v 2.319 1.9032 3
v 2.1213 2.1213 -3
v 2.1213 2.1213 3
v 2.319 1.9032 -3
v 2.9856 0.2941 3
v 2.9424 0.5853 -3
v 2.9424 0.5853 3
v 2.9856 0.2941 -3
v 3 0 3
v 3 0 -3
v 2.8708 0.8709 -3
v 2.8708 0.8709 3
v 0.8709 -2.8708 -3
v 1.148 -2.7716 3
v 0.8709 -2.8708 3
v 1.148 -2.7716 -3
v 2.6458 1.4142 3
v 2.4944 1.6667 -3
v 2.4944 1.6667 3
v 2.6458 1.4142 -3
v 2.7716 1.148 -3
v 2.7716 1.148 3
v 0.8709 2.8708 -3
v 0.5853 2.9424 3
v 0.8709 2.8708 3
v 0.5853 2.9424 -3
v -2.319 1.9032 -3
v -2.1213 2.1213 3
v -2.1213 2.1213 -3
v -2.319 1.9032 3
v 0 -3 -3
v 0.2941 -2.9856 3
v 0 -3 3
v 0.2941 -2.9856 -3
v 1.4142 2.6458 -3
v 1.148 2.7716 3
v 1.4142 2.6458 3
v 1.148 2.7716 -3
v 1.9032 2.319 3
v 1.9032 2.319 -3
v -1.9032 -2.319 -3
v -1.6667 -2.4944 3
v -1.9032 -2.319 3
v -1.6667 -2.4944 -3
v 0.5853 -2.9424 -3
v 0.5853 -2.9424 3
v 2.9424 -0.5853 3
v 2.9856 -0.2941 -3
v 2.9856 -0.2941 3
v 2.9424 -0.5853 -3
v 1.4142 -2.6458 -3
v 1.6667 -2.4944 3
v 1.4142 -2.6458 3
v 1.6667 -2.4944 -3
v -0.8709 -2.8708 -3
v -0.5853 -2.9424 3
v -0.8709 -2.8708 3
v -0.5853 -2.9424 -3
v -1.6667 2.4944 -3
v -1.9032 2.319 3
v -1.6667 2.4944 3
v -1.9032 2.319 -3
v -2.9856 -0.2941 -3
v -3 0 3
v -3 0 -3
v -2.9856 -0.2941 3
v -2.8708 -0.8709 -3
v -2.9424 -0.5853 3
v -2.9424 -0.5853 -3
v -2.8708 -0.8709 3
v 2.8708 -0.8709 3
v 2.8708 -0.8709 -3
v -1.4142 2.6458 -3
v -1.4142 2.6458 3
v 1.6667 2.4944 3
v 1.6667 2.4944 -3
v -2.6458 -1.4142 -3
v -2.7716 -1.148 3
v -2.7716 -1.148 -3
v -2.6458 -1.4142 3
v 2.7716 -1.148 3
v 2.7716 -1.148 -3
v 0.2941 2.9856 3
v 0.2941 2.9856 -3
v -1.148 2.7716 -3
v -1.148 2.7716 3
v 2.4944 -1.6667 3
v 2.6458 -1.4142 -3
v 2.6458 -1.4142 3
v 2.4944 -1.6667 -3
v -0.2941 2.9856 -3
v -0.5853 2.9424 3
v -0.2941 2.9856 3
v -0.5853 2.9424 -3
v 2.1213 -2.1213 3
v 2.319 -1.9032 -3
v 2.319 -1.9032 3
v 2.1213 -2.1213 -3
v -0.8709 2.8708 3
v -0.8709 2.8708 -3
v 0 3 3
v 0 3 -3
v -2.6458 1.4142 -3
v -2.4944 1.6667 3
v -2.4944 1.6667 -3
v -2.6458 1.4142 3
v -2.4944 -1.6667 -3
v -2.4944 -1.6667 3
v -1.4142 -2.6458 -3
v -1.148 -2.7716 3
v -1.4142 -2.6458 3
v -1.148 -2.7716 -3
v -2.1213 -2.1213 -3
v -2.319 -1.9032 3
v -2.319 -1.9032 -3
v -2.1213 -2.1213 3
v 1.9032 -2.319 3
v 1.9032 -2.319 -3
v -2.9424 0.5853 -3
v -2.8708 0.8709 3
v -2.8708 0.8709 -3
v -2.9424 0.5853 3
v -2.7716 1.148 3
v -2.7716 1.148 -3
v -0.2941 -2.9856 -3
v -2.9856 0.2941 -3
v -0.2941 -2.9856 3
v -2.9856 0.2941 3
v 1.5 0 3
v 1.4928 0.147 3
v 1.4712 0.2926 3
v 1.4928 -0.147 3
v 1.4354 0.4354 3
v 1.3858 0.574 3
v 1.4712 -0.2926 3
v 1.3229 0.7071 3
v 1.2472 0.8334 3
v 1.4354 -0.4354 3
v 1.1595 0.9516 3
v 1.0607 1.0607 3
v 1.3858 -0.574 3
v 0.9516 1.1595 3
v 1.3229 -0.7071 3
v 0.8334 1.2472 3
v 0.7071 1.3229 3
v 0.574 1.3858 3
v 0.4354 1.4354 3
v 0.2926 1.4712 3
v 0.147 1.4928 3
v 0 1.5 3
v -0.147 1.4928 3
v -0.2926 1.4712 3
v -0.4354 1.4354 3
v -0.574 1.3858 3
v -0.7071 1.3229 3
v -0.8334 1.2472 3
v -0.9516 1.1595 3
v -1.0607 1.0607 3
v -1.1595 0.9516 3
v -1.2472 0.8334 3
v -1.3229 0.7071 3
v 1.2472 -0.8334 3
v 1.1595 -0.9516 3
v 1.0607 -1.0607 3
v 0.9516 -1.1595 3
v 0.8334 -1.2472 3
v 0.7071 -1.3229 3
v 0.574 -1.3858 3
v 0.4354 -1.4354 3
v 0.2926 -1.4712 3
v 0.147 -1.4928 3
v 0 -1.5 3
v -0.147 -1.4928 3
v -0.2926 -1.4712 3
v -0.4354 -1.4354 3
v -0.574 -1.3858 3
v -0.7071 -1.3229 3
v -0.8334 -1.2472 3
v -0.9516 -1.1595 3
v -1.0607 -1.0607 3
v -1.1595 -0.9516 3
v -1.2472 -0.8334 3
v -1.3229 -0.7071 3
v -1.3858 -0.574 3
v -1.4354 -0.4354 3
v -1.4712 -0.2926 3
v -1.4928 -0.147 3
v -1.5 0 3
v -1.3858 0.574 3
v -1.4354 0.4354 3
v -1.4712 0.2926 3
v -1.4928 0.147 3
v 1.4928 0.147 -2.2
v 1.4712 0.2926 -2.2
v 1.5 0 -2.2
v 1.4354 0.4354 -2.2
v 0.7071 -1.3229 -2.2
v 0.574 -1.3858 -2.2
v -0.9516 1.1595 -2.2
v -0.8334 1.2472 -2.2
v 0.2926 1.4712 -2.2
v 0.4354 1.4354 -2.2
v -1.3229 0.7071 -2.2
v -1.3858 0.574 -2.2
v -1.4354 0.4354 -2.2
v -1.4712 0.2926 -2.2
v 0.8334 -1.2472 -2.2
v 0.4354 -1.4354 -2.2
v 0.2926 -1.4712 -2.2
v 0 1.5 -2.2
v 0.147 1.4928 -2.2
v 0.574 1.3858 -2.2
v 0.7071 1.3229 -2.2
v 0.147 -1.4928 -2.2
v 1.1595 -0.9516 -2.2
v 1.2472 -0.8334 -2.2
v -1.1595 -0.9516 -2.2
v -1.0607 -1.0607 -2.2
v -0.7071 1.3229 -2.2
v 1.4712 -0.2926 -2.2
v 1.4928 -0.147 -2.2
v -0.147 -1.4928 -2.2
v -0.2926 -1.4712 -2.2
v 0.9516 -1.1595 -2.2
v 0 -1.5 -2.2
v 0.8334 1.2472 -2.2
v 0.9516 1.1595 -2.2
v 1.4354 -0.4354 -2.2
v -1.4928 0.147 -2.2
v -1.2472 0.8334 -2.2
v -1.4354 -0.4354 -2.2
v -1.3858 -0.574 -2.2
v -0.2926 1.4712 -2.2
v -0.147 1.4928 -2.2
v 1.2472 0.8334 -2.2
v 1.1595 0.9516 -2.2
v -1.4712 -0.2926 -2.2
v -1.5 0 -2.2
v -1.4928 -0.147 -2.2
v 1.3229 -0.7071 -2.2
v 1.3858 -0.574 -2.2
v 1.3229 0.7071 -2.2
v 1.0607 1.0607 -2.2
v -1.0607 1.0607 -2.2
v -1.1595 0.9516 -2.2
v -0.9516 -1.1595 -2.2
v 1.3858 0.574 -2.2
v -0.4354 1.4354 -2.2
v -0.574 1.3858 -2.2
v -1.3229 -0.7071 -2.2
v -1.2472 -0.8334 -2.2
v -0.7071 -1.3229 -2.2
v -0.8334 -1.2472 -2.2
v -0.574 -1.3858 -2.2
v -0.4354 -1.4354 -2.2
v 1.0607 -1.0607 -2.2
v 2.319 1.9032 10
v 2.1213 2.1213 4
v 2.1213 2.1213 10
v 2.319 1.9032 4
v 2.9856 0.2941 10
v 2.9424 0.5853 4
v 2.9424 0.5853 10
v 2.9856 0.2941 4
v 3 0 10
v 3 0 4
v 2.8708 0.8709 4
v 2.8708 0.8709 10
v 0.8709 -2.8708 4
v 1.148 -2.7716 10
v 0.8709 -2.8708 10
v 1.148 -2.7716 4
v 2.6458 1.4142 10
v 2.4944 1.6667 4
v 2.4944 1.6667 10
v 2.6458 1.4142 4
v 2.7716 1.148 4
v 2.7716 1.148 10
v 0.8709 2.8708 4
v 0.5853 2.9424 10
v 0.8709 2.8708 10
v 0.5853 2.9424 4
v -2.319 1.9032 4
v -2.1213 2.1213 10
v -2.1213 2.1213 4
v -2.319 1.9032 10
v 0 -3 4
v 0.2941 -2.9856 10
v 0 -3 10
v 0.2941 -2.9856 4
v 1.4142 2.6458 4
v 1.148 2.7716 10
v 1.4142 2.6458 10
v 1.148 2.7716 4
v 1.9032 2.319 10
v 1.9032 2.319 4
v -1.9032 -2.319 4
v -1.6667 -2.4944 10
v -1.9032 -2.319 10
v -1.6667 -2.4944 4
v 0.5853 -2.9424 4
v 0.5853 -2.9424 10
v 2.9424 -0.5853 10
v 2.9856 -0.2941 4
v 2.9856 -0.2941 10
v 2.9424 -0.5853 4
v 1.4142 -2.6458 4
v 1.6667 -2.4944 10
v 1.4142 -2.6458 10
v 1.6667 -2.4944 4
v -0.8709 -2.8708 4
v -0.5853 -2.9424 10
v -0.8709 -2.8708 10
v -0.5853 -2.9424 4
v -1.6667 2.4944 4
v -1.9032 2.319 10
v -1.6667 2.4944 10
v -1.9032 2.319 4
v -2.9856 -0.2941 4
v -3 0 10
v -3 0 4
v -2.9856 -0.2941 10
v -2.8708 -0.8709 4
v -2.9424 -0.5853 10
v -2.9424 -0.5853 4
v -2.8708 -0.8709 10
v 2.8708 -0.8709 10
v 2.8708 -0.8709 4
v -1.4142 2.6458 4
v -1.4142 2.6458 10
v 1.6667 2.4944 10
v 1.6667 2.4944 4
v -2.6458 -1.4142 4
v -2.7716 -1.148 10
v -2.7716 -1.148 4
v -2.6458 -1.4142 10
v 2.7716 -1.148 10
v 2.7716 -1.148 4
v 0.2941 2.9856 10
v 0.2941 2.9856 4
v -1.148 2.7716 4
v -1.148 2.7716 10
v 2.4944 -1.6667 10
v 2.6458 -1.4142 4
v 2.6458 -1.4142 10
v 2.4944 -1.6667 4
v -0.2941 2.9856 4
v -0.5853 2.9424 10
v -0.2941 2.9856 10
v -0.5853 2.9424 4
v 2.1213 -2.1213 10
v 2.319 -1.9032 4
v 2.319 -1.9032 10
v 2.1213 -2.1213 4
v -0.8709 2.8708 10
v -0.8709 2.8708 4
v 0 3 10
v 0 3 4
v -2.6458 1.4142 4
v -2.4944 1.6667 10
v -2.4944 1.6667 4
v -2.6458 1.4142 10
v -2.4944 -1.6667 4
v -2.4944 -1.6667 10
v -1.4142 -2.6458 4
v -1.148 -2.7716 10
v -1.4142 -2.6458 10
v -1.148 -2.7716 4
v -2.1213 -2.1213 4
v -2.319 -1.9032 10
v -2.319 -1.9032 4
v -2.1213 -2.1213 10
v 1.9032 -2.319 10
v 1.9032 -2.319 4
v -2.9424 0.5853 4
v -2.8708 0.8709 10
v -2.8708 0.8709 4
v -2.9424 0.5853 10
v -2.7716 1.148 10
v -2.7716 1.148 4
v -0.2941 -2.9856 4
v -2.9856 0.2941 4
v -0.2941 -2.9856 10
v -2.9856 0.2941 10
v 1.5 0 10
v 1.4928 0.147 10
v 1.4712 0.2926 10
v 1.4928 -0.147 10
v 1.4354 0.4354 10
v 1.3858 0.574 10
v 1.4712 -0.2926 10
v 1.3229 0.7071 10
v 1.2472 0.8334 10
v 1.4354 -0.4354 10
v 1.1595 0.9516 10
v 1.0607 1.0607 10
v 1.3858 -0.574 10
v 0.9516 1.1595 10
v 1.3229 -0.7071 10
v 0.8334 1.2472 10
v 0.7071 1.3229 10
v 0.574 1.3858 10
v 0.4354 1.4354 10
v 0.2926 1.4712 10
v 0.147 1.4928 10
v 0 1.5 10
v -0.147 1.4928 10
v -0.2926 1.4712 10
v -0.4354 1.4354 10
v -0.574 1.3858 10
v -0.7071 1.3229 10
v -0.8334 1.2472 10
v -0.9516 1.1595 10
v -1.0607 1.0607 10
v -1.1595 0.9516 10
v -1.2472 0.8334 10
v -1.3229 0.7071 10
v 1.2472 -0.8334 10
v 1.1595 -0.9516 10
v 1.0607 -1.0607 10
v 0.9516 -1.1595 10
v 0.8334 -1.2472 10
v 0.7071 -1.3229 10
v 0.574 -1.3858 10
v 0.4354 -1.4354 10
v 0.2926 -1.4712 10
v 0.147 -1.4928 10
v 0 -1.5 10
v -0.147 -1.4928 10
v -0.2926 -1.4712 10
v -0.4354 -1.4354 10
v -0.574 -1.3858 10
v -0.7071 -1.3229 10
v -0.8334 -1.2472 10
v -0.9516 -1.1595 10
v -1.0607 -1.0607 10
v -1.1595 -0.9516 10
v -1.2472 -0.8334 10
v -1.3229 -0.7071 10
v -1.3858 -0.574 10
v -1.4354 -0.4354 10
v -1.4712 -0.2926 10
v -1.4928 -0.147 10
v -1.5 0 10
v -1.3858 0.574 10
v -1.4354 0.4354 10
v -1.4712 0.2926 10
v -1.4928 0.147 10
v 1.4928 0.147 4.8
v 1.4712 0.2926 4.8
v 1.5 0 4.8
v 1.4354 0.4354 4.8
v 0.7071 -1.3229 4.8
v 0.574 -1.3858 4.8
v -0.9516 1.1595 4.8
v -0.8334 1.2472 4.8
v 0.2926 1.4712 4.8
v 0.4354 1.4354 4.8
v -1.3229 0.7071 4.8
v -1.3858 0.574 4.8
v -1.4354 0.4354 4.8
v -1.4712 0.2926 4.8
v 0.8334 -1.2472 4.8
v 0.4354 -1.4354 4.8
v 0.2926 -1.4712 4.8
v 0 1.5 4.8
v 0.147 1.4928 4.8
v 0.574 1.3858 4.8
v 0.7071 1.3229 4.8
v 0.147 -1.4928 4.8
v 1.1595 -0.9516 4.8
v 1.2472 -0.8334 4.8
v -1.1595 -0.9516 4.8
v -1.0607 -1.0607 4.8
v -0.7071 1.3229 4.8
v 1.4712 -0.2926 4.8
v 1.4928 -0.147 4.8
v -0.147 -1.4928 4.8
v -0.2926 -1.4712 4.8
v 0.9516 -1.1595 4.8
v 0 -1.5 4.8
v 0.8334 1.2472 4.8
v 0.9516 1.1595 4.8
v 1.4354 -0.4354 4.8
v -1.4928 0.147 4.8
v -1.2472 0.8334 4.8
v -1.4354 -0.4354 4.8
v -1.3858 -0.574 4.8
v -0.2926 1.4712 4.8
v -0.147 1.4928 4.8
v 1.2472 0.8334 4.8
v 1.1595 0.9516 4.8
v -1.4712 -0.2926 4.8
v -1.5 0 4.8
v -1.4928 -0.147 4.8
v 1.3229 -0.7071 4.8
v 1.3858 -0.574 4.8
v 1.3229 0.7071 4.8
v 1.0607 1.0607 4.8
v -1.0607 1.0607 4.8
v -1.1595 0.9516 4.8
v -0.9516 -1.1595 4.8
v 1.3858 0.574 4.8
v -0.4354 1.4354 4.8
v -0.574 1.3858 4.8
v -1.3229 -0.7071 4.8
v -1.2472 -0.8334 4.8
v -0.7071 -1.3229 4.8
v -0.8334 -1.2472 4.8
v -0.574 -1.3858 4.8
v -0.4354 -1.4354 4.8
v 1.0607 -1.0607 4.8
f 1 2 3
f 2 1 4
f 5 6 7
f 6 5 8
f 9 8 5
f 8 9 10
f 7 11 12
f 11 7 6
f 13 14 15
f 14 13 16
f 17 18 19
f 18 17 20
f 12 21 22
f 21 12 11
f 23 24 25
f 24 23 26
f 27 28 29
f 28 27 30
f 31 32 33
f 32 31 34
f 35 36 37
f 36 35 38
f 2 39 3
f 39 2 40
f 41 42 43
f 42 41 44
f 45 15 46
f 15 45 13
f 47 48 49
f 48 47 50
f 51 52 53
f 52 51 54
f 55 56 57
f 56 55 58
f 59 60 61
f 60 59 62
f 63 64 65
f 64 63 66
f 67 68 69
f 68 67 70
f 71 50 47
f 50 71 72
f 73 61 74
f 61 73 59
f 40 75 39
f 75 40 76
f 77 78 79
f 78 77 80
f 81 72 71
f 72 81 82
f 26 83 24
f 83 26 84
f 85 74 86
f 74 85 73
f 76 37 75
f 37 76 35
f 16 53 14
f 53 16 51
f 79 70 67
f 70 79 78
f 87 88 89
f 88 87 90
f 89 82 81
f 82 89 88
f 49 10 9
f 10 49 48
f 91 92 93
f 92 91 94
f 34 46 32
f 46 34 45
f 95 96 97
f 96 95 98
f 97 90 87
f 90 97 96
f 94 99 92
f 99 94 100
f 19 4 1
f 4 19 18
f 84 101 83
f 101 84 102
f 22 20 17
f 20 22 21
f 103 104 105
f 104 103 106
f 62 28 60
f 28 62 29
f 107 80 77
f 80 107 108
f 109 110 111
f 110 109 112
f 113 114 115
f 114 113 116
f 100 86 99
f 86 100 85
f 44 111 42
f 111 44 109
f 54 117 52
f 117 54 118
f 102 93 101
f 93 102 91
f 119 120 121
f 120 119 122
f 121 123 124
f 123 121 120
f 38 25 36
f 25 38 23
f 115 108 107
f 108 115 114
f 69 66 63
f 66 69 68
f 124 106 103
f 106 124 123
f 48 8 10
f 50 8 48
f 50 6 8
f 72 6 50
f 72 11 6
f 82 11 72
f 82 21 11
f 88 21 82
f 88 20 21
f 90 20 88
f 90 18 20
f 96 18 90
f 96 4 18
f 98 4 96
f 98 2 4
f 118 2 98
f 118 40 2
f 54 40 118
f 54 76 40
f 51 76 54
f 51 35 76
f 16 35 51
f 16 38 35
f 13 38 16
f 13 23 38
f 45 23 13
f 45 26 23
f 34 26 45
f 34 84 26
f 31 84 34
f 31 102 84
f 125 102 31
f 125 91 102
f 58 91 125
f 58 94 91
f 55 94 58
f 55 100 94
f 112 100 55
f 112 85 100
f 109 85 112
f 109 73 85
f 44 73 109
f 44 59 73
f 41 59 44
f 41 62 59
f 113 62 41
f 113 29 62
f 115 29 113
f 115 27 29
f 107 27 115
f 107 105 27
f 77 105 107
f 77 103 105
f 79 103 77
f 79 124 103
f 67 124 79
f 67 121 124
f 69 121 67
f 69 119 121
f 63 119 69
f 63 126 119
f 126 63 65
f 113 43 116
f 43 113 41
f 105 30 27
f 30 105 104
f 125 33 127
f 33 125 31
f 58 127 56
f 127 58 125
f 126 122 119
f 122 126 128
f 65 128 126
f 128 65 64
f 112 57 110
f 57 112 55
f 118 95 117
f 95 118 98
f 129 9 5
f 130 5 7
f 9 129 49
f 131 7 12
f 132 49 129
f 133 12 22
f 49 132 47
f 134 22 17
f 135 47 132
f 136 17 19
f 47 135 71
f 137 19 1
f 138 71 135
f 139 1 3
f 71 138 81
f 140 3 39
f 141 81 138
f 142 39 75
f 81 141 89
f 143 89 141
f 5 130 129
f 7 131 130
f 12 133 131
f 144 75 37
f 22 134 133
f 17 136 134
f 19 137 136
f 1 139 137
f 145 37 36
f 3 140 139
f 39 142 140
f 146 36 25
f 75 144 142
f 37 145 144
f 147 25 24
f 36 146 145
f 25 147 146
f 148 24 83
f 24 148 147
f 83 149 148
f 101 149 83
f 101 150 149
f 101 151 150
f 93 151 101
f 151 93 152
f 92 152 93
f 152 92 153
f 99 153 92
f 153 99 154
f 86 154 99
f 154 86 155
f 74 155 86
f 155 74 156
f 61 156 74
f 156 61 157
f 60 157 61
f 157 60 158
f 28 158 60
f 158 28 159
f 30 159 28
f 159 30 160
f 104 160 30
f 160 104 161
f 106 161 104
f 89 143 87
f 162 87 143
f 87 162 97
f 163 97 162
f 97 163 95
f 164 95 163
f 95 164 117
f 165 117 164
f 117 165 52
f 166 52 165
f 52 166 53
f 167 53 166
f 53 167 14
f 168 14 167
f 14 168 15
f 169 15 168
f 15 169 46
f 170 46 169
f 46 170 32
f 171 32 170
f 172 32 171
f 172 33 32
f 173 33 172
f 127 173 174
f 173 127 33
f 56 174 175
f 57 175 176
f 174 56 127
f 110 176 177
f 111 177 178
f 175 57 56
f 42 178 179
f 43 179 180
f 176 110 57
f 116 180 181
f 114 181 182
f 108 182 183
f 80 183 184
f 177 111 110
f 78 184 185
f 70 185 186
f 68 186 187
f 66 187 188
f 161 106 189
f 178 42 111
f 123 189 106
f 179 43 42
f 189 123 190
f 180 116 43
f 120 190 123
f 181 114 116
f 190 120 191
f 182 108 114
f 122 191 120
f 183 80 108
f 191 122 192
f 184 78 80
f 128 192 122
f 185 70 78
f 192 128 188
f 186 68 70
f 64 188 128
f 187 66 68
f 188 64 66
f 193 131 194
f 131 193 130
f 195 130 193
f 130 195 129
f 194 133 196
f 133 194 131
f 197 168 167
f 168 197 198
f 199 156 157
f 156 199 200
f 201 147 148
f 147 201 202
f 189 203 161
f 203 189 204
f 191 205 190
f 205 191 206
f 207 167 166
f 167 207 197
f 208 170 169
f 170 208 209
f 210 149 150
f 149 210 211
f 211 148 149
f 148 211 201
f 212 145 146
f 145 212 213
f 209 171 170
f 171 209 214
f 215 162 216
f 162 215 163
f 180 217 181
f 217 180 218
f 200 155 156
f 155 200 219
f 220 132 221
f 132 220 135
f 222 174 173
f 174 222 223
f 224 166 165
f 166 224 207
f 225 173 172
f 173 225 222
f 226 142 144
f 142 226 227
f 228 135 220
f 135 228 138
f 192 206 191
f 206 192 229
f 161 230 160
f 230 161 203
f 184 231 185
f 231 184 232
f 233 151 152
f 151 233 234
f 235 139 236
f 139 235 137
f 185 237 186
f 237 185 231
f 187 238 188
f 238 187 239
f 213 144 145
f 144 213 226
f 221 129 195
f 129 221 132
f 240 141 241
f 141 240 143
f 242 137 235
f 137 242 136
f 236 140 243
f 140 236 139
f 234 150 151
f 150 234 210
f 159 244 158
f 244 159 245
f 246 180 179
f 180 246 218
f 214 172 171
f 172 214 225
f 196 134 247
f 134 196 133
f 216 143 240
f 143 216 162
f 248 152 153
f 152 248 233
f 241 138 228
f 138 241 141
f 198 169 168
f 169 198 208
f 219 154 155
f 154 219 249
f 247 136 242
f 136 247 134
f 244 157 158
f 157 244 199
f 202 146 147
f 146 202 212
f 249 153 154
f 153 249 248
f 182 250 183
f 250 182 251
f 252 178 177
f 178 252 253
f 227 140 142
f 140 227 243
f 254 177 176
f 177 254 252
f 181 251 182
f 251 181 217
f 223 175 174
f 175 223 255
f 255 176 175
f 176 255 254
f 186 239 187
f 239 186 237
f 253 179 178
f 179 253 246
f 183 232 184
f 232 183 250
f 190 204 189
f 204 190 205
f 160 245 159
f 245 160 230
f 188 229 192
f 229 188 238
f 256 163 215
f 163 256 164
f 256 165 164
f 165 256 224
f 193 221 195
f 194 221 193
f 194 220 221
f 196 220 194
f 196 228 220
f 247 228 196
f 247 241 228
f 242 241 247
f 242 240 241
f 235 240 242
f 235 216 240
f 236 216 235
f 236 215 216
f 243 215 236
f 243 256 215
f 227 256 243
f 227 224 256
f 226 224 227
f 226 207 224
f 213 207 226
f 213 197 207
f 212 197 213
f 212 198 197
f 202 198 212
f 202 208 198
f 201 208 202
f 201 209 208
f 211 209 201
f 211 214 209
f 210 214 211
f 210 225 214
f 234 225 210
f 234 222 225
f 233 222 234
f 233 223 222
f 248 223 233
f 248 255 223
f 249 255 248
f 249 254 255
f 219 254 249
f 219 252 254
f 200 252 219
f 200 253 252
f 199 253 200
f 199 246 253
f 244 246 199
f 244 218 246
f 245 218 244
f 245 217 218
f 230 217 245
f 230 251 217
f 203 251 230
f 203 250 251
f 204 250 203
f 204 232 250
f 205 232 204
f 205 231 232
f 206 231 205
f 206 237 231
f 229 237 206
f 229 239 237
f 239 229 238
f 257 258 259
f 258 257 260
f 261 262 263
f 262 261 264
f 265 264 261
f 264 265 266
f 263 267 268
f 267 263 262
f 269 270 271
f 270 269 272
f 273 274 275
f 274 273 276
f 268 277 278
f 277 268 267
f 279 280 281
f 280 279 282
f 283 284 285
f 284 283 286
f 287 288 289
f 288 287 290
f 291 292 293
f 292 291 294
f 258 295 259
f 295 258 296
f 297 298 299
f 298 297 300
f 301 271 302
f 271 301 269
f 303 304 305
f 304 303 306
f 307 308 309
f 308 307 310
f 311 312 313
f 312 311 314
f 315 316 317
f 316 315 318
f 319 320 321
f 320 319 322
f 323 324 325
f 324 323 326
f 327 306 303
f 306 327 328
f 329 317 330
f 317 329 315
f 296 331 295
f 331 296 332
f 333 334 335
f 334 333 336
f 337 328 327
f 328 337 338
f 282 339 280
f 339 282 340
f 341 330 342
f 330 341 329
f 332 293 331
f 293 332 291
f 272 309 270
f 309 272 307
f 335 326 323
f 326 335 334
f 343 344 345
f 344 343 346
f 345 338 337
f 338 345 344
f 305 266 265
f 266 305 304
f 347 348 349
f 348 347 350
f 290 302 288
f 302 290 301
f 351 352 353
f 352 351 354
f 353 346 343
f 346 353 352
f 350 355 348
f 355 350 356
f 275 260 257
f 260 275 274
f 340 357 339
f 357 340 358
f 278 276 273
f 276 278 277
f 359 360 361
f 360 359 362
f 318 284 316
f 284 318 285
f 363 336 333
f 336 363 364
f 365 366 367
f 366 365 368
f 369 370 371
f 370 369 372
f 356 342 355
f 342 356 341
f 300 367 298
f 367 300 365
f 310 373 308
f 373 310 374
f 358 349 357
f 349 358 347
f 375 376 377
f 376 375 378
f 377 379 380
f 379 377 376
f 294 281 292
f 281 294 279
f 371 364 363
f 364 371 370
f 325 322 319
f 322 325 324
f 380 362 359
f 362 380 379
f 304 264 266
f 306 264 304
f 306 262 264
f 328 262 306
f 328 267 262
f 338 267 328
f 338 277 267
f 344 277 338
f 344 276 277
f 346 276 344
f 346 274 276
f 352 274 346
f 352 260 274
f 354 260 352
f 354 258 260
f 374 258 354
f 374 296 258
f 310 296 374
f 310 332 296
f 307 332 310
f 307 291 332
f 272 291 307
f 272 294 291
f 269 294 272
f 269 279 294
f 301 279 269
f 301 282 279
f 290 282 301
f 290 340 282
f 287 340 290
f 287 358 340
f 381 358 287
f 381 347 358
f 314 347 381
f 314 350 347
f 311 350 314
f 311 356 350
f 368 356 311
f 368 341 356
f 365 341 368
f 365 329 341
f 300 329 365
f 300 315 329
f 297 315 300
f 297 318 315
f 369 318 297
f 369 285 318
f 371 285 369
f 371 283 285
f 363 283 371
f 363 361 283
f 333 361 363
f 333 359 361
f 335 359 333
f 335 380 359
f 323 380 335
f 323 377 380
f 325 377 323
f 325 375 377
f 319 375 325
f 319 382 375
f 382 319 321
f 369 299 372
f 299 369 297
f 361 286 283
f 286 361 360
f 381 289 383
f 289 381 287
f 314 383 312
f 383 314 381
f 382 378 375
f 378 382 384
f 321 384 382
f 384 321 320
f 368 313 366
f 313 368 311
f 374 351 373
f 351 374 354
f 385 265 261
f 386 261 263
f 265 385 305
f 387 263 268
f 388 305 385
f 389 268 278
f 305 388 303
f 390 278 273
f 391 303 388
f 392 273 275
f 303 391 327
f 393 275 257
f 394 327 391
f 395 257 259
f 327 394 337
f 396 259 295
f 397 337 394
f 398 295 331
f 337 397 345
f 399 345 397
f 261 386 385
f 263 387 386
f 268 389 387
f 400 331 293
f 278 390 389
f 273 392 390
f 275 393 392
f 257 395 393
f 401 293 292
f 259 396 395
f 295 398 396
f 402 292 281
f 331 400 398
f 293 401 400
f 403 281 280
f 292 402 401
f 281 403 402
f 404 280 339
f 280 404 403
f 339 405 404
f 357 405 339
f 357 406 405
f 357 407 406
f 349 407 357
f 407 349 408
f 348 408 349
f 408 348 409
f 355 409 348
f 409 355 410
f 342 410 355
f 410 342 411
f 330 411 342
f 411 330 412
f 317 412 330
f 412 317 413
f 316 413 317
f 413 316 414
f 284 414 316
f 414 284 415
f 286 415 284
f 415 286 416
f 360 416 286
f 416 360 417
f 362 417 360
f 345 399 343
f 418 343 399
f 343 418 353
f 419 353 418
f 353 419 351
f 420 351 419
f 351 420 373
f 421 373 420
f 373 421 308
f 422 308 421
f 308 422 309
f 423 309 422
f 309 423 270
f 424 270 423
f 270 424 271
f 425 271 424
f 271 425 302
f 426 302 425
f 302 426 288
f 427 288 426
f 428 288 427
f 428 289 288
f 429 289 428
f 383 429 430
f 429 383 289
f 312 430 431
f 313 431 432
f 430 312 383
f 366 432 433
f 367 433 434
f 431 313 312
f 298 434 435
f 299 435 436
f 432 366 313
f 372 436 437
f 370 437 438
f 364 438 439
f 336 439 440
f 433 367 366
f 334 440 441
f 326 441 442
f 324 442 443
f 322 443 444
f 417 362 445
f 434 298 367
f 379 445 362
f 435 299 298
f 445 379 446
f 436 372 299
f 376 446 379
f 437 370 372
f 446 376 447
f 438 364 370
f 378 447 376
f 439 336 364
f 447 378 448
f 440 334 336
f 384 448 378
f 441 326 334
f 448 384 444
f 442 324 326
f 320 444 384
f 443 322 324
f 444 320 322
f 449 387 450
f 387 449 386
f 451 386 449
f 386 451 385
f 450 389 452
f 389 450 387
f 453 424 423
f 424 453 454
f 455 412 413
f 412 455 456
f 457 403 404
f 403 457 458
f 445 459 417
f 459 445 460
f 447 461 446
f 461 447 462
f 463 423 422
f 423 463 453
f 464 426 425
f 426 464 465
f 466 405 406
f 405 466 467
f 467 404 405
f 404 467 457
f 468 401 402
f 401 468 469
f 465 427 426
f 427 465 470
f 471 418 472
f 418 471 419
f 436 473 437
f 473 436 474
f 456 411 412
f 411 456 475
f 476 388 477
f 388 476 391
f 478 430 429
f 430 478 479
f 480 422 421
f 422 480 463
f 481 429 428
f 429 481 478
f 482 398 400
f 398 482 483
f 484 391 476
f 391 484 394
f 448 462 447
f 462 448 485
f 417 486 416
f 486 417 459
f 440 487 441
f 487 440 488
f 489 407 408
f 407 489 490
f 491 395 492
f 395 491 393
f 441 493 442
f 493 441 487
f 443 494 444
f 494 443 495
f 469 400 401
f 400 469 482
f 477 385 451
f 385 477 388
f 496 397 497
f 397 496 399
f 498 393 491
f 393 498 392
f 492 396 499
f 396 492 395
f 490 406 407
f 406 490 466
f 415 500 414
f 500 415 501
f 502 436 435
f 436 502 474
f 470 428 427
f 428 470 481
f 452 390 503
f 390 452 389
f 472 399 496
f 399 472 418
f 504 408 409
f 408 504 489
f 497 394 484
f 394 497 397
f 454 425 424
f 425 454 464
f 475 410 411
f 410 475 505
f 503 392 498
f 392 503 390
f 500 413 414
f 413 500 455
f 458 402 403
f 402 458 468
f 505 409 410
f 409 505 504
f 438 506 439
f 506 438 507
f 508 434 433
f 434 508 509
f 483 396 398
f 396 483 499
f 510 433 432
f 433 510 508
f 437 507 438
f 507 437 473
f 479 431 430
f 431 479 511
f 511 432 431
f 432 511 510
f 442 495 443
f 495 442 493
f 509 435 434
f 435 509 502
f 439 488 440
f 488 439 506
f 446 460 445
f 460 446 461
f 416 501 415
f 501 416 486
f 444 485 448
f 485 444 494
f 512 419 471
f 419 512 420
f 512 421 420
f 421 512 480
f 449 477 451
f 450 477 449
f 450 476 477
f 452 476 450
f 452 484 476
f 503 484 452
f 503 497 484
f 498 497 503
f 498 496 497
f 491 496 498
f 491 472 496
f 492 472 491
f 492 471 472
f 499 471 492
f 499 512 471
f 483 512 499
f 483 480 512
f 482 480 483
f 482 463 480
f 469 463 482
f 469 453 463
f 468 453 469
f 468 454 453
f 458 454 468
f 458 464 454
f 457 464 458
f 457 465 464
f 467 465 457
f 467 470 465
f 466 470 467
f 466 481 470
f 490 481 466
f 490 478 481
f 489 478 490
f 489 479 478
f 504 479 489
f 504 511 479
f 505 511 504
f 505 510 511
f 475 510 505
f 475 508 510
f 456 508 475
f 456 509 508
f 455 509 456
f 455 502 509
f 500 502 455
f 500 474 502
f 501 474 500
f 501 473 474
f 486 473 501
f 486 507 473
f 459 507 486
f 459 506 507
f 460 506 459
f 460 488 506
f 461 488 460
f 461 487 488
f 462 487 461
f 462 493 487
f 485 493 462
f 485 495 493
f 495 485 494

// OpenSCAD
// Parameters
thread_diameter_mm = 3.0; //[1.5:6.0:0.1]
length_mm = 6.0; //[3.0:12.0:0.5]
outer_diameter_mm = 6.0; //[3.5:12.0:0.5]
top_thread_length_mm = 6.0; //[0.0:6.0:0.5]
bottom_thread_length_mm = 0.0; //[0.0:6.0:0.5]
overlap_mm = 1.0; //[0.5:2.0:0.1]
eps_mm = 0.2; //[0.05:0.5:0.05]

// Standoff - complete geometry
module standoff() {
  color("Silver") {
    difference() {
      // Pillar body
      translate([0, 0, 0])
        cylinder(h=length_mm, r=outer_diameter_mm/2, center=true, $fn=64);
      
      // Top threaded section (hole)
      translate([0, 0, length_mm/2 - (top_thread_length_mm + eps_mm)/2 + overlap_mm])
        cylinder(h=top_thread_length_mm + eps_mm, r=thread_diameter_mm/2, center=true, $fn=64);
      
      // Bottom threaded section (hole)
      translate([0, 0, -length_mm/2 + (bottom_thread_length_mm + eps_mm)/2 - overlap_mm])
        cylinder(h=bottom_thread_length_mm + eps_mm, r=thread_diameter_mm/2, center=true, $fn=64);
    }
  }
}

// Pillar - complete geometry
module pillar() {
  color("DimGray") {
    // Using the same geometry as standoff for demonstration
    standoff();
  }
}

// Assembly
module assembly() {
  standoff();
  translate([0, 0, length_mm + 1]) pillar(); // Adjust position to stack on top
}

assembly();
